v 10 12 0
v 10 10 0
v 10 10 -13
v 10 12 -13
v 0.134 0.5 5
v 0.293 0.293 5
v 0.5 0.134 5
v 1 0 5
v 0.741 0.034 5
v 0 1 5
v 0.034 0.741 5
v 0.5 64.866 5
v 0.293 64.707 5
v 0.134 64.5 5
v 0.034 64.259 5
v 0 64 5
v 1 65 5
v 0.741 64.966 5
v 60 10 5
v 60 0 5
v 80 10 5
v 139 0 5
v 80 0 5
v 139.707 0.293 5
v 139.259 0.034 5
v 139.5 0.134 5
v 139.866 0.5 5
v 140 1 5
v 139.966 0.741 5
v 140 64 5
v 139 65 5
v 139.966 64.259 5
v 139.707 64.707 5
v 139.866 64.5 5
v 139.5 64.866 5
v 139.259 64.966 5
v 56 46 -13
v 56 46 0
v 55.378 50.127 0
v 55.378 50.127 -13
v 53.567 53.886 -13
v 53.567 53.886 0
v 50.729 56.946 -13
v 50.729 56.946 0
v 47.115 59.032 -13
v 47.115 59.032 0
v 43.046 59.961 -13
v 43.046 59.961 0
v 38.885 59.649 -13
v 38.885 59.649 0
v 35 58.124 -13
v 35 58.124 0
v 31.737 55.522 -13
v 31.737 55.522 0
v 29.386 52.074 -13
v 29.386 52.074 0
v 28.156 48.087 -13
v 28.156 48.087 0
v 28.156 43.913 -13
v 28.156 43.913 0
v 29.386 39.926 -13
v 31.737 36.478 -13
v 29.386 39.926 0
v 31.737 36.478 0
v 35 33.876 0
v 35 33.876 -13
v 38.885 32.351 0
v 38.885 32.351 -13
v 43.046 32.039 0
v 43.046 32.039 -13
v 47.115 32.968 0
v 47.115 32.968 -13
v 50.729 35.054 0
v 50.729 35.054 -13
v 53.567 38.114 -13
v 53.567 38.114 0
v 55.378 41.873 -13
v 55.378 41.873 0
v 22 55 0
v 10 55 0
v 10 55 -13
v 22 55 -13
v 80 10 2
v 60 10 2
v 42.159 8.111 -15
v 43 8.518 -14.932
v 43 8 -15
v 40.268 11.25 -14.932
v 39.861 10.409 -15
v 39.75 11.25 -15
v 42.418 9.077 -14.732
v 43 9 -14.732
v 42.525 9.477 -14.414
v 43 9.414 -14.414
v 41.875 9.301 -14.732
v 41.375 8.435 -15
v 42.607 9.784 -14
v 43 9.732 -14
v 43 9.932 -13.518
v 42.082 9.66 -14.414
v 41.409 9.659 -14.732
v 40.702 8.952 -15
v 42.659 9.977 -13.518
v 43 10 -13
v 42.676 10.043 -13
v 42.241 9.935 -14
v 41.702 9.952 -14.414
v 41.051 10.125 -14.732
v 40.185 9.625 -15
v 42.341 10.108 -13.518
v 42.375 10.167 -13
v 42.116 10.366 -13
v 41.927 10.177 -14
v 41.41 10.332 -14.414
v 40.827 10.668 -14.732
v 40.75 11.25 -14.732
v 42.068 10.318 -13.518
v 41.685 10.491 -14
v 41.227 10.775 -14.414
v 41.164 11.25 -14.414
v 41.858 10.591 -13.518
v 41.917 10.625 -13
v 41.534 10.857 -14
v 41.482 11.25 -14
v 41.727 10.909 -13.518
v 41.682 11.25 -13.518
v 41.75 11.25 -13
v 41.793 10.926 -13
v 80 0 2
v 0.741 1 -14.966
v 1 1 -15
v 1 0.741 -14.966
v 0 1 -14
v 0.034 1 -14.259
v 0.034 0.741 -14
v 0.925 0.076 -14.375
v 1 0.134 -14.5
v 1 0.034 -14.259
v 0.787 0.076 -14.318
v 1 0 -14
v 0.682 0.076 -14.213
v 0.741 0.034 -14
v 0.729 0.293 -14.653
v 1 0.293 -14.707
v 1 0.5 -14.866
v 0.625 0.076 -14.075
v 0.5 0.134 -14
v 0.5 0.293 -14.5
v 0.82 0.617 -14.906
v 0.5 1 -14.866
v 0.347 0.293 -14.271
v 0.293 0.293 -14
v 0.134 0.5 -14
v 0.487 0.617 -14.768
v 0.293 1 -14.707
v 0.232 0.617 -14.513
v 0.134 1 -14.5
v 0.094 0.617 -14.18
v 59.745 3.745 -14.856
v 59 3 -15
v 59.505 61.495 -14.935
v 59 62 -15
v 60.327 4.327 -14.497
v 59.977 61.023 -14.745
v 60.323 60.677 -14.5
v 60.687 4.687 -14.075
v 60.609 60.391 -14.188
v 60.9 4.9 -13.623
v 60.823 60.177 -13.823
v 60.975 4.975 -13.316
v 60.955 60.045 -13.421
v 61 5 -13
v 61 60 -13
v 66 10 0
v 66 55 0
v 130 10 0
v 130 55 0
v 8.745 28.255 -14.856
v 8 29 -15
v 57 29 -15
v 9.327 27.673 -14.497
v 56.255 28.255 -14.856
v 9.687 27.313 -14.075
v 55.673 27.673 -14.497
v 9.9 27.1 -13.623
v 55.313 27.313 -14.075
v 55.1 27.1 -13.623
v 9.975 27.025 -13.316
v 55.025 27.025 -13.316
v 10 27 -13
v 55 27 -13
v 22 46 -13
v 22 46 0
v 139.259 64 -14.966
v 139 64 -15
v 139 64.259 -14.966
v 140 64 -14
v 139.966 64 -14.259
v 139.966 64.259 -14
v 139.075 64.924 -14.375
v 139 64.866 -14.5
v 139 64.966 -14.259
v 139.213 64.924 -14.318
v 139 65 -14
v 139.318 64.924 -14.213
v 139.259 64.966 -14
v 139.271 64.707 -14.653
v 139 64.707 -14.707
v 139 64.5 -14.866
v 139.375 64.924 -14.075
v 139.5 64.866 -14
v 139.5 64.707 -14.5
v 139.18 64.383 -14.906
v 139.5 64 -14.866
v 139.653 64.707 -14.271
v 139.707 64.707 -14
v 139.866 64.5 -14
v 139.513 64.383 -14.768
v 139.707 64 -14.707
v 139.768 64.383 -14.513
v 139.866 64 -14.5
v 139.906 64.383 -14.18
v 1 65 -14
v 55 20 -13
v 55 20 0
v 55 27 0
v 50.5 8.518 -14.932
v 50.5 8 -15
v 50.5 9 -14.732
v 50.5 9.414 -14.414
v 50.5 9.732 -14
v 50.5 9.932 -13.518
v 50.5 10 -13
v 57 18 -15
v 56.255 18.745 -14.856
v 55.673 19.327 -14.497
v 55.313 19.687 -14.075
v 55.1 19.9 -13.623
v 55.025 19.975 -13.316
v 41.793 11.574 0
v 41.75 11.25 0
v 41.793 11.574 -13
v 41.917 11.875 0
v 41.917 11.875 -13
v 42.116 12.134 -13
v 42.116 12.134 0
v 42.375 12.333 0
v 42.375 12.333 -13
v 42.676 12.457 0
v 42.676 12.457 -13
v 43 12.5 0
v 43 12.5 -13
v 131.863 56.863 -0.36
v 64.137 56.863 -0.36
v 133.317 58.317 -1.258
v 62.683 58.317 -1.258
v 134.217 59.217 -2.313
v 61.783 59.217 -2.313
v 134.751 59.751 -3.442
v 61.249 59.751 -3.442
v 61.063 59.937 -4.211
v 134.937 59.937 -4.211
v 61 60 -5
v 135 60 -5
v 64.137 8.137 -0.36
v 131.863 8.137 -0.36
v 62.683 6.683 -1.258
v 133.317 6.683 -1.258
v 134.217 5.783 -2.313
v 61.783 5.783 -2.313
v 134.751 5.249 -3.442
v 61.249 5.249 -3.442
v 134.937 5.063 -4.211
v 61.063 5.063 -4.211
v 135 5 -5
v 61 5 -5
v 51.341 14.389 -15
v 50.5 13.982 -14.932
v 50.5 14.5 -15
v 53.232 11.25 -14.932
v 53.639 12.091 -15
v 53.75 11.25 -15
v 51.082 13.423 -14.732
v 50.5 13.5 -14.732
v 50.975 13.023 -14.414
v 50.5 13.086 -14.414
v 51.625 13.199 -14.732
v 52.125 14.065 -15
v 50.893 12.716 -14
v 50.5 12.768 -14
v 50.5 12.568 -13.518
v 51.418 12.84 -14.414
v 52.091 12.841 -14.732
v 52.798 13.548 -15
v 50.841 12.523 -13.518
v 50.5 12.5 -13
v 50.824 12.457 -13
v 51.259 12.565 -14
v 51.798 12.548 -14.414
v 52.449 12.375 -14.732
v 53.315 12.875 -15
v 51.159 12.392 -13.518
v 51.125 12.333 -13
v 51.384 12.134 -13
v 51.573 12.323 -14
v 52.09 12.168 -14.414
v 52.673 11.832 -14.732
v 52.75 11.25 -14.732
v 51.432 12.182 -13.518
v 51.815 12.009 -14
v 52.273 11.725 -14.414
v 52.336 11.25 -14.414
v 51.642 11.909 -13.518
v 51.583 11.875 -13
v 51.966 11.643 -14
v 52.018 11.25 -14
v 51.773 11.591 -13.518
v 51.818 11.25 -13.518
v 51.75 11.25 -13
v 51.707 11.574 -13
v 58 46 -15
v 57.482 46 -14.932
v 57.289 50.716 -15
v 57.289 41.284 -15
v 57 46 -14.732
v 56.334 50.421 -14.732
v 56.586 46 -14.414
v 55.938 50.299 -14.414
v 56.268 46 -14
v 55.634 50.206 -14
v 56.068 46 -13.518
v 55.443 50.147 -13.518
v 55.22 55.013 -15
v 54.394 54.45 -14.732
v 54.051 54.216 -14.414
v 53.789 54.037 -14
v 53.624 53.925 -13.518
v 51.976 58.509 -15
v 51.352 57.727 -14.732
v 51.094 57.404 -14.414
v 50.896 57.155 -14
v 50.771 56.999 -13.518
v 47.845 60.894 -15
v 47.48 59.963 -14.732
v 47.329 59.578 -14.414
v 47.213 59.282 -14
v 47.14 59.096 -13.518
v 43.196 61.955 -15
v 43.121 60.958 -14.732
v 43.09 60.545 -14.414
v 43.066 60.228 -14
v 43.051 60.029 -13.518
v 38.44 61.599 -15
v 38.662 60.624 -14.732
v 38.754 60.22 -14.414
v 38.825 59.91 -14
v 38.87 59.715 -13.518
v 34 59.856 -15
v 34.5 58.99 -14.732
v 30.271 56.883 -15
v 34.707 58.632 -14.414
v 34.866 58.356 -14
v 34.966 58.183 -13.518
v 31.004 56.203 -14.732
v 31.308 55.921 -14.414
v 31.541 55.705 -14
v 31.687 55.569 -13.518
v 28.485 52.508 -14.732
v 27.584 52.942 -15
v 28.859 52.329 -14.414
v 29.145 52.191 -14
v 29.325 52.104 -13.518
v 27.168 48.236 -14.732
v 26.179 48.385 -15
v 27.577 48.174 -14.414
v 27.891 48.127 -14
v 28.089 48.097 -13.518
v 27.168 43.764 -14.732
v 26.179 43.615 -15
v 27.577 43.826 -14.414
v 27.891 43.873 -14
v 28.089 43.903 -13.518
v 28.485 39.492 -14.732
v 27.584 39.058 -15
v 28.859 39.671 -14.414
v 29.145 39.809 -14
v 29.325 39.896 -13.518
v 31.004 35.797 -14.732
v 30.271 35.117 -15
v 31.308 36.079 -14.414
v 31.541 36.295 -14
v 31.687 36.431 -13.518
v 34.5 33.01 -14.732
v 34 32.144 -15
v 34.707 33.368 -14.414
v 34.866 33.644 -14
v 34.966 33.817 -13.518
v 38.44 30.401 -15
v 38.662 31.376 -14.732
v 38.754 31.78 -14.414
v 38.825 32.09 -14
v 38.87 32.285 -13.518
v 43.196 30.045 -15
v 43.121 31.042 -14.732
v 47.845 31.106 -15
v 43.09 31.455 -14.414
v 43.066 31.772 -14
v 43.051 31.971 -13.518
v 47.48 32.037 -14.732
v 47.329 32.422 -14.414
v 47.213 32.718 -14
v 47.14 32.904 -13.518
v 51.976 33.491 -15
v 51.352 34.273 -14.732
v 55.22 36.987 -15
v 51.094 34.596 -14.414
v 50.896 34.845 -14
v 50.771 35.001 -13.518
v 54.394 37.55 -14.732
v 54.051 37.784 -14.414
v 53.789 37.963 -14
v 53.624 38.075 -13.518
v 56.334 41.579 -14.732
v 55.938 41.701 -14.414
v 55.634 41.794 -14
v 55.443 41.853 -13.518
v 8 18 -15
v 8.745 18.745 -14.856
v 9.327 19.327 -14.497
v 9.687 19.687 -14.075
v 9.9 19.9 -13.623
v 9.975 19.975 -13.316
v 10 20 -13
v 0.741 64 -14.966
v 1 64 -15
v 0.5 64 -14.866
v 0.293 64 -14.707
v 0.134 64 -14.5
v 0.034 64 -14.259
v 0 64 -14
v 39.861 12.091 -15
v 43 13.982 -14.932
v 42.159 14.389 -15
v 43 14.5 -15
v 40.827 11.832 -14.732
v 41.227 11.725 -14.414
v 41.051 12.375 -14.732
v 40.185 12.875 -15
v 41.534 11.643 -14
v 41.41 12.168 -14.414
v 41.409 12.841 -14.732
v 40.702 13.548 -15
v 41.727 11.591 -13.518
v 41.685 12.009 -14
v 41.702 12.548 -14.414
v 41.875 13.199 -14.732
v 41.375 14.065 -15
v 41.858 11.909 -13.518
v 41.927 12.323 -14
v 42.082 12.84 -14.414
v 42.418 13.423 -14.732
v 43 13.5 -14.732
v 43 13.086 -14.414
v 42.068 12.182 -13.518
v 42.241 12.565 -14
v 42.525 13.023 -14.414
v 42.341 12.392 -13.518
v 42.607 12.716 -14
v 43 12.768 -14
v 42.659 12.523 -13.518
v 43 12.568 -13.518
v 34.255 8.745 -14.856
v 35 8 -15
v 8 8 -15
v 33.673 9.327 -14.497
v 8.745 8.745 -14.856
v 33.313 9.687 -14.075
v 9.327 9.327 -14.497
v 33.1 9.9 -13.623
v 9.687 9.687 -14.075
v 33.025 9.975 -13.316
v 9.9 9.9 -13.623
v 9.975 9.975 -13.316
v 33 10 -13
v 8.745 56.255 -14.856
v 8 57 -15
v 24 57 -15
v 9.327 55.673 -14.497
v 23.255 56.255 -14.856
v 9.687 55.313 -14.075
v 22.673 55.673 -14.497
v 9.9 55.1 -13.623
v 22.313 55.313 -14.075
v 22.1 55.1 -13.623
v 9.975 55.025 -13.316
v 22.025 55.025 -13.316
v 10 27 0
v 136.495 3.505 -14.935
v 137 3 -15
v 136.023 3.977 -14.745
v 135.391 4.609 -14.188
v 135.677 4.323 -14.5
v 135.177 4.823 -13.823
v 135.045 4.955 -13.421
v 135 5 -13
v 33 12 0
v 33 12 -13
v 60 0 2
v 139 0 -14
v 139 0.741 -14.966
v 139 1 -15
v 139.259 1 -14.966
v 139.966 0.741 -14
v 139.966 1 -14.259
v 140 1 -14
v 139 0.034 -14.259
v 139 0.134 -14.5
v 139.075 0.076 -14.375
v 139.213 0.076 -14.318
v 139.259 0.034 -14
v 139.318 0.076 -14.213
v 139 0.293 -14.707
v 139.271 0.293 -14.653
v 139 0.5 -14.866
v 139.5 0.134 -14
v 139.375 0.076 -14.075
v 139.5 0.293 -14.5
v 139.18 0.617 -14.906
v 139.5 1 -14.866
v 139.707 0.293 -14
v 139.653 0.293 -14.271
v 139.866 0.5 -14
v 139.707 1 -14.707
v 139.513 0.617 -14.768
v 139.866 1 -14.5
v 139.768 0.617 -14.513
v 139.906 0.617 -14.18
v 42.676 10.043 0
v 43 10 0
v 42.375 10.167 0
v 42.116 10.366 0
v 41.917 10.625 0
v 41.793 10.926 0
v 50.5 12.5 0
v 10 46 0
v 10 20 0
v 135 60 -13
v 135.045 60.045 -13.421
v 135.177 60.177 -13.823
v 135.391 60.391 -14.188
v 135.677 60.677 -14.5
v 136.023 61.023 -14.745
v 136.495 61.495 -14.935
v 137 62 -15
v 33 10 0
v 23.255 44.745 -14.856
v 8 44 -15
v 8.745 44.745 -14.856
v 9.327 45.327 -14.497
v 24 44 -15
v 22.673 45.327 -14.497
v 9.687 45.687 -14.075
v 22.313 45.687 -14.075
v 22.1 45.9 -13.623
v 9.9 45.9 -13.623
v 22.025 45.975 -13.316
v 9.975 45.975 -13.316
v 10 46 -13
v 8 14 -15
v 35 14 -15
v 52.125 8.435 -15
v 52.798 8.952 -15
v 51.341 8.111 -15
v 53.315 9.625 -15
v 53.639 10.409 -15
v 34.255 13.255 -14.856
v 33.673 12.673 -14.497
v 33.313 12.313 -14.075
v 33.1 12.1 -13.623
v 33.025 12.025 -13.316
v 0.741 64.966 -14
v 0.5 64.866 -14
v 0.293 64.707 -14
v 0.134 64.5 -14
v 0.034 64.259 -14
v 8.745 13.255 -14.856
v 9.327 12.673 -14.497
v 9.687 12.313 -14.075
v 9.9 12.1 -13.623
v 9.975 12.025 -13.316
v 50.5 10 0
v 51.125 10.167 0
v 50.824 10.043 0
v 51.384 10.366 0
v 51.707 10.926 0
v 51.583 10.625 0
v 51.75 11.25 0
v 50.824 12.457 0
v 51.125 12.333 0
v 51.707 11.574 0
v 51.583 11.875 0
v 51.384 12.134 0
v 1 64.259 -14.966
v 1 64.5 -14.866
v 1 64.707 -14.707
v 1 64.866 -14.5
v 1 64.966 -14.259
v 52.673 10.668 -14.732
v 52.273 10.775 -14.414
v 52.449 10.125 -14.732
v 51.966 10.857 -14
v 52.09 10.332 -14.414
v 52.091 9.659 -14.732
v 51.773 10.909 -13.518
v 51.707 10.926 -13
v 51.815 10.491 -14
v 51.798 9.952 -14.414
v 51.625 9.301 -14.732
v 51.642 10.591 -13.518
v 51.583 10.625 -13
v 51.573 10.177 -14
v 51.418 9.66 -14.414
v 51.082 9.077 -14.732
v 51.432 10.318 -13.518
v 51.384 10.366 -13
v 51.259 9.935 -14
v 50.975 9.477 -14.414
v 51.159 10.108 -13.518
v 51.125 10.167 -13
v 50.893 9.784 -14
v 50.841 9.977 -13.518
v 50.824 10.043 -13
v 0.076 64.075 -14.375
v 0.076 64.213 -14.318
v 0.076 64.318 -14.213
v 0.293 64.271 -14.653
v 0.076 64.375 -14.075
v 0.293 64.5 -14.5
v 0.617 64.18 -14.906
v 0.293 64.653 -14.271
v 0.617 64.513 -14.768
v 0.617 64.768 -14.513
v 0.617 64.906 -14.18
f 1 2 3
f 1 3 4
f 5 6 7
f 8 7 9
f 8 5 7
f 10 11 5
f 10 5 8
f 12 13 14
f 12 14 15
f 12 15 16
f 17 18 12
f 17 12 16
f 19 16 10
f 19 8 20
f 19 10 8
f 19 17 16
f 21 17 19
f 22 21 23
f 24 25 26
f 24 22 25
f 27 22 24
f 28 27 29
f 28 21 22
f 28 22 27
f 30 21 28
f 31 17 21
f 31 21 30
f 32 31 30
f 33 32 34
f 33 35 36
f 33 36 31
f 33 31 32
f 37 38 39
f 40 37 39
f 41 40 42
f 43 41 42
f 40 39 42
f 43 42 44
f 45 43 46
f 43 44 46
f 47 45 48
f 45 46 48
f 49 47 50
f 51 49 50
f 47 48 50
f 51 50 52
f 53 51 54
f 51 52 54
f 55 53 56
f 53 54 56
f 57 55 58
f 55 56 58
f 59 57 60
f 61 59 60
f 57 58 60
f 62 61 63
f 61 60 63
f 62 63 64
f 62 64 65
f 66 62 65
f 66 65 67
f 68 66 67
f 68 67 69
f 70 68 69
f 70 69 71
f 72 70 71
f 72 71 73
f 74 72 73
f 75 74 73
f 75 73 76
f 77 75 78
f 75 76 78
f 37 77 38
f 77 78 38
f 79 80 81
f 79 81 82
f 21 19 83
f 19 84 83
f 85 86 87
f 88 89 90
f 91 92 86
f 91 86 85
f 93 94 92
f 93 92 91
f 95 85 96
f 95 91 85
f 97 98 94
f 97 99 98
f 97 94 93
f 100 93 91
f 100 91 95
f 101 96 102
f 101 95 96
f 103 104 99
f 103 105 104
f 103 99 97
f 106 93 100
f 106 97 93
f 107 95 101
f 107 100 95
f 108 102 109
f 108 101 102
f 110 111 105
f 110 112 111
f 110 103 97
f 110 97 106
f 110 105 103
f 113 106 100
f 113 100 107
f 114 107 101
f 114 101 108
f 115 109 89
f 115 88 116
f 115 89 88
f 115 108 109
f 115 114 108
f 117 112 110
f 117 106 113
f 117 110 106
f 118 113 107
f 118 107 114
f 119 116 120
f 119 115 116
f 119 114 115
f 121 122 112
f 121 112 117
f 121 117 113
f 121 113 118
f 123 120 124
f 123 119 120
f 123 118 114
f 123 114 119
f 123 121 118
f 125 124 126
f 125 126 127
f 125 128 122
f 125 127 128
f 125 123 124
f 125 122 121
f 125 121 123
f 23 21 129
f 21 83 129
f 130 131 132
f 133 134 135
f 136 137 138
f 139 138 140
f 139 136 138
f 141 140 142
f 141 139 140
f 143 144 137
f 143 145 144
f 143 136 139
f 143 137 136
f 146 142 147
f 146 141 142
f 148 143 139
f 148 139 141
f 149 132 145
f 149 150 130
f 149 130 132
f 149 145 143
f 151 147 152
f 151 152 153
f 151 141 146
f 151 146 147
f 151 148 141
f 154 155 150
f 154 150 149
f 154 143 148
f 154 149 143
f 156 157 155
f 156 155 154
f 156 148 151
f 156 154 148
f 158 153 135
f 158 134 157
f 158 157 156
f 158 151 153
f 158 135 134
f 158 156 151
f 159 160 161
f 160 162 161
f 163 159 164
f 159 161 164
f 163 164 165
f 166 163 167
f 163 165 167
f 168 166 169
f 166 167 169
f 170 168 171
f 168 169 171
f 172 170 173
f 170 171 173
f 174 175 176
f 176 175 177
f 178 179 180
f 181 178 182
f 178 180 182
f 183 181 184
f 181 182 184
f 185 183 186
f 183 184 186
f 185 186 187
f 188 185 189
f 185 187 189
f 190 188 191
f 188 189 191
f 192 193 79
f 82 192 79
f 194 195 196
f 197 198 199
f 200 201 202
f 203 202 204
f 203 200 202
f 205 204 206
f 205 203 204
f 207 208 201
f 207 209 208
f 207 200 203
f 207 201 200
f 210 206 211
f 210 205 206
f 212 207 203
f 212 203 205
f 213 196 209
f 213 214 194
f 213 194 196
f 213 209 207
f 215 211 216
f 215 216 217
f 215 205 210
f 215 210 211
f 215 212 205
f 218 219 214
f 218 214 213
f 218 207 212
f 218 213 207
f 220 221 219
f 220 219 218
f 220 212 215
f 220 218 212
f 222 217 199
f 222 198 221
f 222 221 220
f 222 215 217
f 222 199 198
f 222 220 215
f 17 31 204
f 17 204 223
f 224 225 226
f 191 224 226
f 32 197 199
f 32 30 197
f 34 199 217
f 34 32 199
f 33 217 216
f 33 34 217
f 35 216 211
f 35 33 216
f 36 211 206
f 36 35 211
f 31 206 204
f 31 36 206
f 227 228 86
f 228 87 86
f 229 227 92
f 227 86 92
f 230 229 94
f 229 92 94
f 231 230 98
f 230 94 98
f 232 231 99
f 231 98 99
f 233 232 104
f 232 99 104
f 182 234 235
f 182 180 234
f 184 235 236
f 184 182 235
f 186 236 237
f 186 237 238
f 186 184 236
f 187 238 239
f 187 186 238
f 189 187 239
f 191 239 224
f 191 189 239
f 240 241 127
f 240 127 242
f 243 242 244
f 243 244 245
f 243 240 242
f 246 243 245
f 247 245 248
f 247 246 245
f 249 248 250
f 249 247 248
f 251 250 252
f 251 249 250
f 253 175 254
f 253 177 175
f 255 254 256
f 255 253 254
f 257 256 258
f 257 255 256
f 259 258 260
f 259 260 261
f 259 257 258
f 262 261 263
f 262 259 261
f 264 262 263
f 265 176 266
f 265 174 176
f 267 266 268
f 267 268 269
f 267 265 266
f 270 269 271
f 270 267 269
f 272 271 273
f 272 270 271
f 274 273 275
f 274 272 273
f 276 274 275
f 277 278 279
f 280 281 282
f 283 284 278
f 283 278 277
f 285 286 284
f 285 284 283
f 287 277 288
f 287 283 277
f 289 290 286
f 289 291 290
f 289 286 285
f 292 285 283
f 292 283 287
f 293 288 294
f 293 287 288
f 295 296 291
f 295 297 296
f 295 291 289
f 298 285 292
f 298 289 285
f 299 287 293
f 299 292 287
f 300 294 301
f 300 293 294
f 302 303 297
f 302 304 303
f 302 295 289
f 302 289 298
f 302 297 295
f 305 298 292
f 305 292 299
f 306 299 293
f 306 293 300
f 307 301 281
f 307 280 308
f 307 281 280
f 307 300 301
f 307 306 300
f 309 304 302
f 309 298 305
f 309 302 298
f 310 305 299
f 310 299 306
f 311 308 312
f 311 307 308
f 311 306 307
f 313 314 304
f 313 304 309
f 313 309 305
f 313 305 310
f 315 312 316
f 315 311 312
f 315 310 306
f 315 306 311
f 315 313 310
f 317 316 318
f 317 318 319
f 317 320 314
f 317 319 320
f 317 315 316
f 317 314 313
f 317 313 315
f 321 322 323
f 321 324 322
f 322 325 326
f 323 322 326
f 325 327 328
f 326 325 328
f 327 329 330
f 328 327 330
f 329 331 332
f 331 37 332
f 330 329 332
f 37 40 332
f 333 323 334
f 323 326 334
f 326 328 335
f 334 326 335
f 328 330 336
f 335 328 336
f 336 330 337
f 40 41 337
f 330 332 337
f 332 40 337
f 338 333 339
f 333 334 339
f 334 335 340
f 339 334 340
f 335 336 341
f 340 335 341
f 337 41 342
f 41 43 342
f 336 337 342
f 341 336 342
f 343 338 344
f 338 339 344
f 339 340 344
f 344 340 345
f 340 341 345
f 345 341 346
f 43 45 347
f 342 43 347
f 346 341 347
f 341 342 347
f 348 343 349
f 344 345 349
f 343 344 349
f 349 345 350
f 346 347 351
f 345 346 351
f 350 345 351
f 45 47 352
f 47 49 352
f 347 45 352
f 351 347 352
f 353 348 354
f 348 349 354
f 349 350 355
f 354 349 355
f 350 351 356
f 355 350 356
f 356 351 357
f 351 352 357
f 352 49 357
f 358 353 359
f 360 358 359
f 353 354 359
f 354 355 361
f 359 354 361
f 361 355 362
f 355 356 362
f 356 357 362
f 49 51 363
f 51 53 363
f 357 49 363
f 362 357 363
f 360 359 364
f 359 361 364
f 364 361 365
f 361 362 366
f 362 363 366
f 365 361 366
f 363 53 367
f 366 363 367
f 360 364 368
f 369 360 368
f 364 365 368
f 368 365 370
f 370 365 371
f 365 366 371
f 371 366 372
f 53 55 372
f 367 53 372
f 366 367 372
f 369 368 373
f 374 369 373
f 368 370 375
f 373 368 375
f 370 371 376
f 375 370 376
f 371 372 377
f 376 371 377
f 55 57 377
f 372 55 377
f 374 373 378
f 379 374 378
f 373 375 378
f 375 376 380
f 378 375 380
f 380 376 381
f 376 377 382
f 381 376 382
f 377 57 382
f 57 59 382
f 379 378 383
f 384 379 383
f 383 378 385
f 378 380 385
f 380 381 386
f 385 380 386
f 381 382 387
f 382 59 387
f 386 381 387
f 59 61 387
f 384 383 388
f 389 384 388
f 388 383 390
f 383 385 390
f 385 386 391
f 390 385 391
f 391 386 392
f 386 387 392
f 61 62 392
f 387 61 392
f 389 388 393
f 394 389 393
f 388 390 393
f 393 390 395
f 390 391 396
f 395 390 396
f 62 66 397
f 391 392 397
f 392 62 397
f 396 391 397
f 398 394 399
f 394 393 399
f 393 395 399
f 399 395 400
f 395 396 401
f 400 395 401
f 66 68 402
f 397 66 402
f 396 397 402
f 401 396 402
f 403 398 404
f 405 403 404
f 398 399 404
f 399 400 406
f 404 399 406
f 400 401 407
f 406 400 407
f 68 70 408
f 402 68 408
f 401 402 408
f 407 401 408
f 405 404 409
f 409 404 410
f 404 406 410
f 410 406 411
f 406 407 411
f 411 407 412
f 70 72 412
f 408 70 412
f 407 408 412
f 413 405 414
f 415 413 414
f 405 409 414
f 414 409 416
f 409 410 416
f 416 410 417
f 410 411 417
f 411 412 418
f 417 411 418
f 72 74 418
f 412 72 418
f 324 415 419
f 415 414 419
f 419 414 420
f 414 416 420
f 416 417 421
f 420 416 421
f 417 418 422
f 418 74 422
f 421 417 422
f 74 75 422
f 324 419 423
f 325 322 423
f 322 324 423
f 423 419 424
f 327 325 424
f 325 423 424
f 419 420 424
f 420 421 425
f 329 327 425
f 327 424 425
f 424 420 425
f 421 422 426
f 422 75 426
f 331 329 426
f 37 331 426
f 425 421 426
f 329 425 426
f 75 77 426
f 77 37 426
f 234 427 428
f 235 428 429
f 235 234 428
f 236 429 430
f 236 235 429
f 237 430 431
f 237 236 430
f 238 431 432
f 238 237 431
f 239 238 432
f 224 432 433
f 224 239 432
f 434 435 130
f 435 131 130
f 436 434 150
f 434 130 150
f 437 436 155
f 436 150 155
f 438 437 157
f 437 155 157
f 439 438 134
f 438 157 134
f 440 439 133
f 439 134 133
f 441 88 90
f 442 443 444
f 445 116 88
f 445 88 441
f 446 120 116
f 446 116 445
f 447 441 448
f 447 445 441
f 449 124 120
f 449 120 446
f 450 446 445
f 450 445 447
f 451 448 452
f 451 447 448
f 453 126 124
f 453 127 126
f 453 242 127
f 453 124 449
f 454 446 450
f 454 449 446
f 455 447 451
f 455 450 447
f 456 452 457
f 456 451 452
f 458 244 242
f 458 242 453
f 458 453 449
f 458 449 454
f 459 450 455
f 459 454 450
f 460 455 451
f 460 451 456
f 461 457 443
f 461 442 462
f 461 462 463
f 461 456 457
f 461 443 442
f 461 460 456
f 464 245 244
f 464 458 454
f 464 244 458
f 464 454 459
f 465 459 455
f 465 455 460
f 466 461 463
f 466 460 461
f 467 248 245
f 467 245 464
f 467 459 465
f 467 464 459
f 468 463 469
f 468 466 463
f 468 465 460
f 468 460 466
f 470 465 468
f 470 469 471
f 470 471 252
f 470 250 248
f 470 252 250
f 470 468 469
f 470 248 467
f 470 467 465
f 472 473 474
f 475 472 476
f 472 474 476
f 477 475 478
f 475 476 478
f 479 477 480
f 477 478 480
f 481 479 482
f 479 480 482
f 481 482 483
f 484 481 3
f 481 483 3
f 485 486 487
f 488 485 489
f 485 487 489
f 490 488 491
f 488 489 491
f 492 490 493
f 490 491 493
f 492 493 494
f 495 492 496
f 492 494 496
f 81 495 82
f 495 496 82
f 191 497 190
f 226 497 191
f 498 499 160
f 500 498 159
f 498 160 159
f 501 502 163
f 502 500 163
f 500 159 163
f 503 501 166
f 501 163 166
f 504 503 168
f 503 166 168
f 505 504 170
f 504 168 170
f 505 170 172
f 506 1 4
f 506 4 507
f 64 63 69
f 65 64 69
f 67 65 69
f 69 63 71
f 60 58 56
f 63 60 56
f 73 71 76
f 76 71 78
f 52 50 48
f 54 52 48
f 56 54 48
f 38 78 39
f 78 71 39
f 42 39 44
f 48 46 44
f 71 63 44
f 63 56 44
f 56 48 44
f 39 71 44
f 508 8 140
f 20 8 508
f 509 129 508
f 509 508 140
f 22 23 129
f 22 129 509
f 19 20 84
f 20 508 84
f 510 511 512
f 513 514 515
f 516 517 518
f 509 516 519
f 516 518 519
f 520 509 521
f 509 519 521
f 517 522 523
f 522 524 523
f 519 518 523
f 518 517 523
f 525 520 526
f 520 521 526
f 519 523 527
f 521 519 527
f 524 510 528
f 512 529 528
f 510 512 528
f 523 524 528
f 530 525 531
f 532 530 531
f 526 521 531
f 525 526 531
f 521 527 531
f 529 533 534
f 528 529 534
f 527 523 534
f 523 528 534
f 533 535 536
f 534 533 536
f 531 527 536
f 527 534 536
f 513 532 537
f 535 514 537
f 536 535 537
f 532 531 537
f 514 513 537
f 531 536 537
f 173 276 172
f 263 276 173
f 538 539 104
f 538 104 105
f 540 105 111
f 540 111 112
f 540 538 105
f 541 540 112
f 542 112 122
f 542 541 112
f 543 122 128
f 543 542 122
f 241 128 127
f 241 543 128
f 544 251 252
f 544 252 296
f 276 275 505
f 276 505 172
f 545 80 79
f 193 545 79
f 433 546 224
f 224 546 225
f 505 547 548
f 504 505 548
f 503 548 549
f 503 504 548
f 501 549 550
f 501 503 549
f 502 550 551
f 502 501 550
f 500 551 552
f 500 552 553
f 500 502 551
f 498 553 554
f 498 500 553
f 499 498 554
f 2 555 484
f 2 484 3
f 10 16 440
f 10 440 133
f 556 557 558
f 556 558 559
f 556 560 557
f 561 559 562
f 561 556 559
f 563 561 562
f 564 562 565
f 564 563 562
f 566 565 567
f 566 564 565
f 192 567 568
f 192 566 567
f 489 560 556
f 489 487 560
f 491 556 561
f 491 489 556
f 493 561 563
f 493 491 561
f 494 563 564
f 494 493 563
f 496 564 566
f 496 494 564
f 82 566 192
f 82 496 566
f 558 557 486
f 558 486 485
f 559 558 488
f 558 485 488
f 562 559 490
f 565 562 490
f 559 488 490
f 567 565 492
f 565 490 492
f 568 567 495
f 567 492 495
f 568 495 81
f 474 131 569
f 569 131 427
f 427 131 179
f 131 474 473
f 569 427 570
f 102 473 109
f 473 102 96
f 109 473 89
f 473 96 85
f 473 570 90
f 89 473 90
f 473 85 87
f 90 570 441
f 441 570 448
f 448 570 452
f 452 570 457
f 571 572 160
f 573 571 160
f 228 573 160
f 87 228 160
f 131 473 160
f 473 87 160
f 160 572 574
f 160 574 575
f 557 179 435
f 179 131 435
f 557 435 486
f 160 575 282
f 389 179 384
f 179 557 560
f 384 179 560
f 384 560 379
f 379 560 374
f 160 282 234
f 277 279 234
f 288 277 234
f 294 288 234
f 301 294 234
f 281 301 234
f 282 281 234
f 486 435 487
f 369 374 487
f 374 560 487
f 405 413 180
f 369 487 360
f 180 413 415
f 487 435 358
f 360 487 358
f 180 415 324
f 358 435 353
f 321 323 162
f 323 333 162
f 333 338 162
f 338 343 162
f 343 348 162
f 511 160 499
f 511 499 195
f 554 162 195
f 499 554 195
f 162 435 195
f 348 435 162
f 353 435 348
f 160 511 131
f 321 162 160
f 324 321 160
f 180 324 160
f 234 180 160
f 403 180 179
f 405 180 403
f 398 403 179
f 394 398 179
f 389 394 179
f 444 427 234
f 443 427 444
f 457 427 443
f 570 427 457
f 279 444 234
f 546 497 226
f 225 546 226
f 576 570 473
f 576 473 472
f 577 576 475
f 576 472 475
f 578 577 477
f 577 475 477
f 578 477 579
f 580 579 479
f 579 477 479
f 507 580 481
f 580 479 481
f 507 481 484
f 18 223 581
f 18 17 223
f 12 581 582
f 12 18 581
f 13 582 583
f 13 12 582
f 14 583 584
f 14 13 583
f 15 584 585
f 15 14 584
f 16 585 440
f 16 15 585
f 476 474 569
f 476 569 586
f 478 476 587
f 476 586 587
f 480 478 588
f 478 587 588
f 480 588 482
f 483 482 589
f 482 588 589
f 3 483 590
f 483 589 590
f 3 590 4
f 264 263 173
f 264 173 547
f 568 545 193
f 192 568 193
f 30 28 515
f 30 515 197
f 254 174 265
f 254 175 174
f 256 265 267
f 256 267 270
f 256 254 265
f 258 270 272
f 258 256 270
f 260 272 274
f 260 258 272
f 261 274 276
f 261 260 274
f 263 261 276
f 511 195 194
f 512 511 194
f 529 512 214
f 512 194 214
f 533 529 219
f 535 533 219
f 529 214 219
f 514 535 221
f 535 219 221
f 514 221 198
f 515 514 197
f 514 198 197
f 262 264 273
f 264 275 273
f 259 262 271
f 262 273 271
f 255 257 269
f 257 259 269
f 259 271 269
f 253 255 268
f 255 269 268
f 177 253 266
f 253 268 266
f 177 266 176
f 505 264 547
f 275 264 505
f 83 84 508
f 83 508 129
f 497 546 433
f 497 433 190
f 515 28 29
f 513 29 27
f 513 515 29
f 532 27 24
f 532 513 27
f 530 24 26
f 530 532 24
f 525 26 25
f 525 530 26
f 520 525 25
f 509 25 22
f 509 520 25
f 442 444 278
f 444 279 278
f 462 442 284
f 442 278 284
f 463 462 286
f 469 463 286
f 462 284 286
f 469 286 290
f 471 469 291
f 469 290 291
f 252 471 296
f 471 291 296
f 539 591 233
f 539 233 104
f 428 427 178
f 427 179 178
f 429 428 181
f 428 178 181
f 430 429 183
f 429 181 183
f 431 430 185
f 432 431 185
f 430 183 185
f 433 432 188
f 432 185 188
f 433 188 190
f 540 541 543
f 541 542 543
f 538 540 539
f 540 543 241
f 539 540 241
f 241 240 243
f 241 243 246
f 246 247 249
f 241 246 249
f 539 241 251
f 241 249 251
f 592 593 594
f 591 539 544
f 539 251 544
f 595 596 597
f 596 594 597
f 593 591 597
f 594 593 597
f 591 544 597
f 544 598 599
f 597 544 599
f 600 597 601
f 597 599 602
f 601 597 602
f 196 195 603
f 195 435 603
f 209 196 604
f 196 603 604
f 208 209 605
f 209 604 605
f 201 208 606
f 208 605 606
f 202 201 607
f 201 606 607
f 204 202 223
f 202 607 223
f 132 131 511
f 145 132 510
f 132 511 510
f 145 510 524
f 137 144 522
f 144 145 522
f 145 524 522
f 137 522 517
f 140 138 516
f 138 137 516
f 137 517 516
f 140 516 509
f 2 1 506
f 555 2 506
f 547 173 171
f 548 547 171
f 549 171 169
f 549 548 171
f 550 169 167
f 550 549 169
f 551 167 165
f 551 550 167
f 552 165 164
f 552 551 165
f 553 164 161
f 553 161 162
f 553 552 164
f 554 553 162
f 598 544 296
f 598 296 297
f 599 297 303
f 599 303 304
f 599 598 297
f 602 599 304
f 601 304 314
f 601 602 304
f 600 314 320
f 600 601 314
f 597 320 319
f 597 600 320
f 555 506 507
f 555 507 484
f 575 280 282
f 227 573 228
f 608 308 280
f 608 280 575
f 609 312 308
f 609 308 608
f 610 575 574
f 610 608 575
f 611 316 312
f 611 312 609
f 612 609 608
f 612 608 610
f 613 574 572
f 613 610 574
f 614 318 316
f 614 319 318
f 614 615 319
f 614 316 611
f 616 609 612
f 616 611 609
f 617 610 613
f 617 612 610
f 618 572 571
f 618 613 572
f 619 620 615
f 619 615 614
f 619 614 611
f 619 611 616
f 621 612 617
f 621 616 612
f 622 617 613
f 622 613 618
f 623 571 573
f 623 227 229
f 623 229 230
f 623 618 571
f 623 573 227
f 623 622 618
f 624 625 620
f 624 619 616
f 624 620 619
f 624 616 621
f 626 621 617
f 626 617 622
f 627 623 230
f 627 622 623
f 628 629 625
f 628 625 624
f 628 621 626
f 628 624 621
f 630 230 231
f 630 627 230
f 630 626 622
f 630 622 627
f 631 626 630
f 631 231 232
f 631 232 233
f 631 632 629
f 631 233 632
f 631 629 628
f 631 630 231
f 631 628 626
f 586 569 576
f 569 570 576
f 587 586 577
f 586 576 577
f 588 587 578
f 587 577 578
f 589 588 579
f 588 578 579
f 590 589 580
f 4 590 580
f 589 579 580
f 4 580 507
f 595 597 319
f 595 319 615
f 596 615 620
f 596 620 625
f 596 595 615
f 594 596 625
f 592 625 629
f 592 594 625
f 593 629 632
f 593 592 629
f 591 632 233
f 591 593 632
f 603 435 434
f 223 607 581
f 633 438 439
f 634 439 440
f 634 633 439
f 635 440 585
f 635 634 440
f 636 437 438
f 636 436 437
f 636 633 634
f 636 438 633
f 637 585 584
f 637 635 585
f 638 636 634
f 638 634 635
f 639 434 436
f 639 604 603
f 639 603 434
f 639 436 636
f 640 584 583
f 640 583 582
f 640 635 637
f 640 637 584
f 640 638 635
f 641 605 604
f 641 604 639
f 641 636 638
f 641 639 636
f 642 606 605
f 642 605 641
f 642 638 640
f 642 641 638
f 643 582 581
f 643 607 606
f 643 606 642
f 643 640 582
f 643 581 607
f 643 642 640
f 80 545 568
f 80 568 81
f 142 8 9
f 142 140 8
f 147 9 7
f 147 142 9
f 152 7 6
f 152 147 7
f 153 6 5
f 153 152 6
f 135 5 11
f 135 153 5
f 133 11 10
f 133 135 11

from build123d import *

# Parameters (mm, degrees)
F1_DEPTH = 3
F0_W     = 20
F0_H     = 10
F2_DEPTH = 2
F3_W     = 45
F3_H     = 7
F3_R     = 14
F3_W_2   = 12
F3_H_2   = 9
F4_DEPTH = 15
F5_R     = 5
F6_R     = 2
F7_R     = 1


with BuildPart() as f1:
    # F0 (on Top) → F1 (new body)
    with BuildSketch(Plane.XY):
        Polygon((0, 65), (0, 0), (60, 0), (60, 10), (80, 10), (80, 0), (140, 0), (140, 65), align=None)
    extrude(amount=F1_DEPTH)

    # F1_face (on face) + F0 (on Top) → F2 (join)
    with BuildSketch(Plane(origin=(70, 33.1179775281, 3), x_dir=(1, 0, 0), z_dir=(0, 0, 1))):
        Polygon((-70, 31.8820224719), (-70, -33.1179775281), (-10, -33.1179775281), (-10, -23.1179775281), (10, -23.1179775281), (10, -33.1179775281), (70, -33.1179775281), (70, 31.8820224719), align=None)
    with BuildSketch(Plane.XY):
        with Locations((70, 5)):
            Rectangle(F0_W, F0_H)
    extrude(amount=F2_DEPTH)

    # F3 (on face) → F4 (join)
    with BuildSketch(Plane.XY):
        Polygon((61, 5), (61, 10), (60, 10), (60, 0), (80, 0), (80, 5), align=None)
        Polygon((61, 60), (135, 60), (135, 5), (80, 5), (80, 0), (140, 0), (140, 65), (0, 65), (0, 0), (60, 0), (60, 10), (61, 10), align=None)
        Polygon((10, 12), (33, 12), (33, 10), (11.25, 10), (10, 10), (10, 11.25), align=None, mode=Mode.SUBTRACT)
        with BuildLine():
            Line((43, 12.5), (50.5, 12.5))
            ThreePointArc((50.5, 12.5), (51.3838834765, 12.1338834765), (51.75, 11.25))
            ThreePointArc((51.75, 11.25), (51.3838834765, 10.3661165235), (50.5, 10))
            Line((50.5, 10), (43, 10))
            ThreePointArc((43, 10), (42.1161165235, 10.3661165235), (41.75, 11.25))
            ThreePointArc((41.75, 11.25), (42.1161165235, 12.1338834765), (43, 12.5))
        make_face(mode=Mode.SUBTRACT)
        with Locations((32.5, 23.5)):
            Rectangle(F3_W, F3_H, mode=Mode.SUBTRACT)
        with Locations((42, 46)):
            Circle(F3_R, mode=Mode.SUBTRACT)
        with Locations((16, 50.5)):
            Rectangle(F3_W_2, F3_H_2, mode=Mode.SUBTRACT)
    extrude(amount=-F4_DEPTH)

    # F5
    f5_edges = [f1.edges().sort_by_distance(p)[0] for p in [
        (98, 60, 0),
        (61, 32.5, 0),
        (98, 5, 0),
        (135, 32.5, 0),
    ]]
    fillet(f5_edges, radius=F5_R)

    # F6
    f6_edges = [f1.edges().sort_by_distance(p)[0] for p in [
        (98, 60, -15),
        (135, 32.5, -15),
        (98, 5, -15),
        (61, 32.5, -15),
        (28, 46, -15),
        (16, 55, -15),
        (10, 50.5, -15),
        (16, 46, -15),
        (22, 50.5, -15),
        (32.5, 27, -15),
        (10, 23.5, -15),
        (32.5, 20, -15),
        (55, 23.5, -15),
        (46.75, 12.5, -15),
        (21.5, 10, -15),
        (33, 11, -15),
        (21.5, 12, -15),
        (10, 11, -15),
    ]]
    fillet(f6_edges, radius=F6_R)

    # F7
    f7_edges = [f1.edges().sort_by_distance(p)[0] for p in [
        (140, 32.5, -15),
        (70, 65, -15),
        (0, 32.5, -15),
        (70, 0, -15),
        (0, 0, -5),
        (140, 0, -5),
        (140, 65, -5),
        (0, 65, -5),
    ]]
    fillet(f7_edges, radius=F7_R)


solid = f1.part
